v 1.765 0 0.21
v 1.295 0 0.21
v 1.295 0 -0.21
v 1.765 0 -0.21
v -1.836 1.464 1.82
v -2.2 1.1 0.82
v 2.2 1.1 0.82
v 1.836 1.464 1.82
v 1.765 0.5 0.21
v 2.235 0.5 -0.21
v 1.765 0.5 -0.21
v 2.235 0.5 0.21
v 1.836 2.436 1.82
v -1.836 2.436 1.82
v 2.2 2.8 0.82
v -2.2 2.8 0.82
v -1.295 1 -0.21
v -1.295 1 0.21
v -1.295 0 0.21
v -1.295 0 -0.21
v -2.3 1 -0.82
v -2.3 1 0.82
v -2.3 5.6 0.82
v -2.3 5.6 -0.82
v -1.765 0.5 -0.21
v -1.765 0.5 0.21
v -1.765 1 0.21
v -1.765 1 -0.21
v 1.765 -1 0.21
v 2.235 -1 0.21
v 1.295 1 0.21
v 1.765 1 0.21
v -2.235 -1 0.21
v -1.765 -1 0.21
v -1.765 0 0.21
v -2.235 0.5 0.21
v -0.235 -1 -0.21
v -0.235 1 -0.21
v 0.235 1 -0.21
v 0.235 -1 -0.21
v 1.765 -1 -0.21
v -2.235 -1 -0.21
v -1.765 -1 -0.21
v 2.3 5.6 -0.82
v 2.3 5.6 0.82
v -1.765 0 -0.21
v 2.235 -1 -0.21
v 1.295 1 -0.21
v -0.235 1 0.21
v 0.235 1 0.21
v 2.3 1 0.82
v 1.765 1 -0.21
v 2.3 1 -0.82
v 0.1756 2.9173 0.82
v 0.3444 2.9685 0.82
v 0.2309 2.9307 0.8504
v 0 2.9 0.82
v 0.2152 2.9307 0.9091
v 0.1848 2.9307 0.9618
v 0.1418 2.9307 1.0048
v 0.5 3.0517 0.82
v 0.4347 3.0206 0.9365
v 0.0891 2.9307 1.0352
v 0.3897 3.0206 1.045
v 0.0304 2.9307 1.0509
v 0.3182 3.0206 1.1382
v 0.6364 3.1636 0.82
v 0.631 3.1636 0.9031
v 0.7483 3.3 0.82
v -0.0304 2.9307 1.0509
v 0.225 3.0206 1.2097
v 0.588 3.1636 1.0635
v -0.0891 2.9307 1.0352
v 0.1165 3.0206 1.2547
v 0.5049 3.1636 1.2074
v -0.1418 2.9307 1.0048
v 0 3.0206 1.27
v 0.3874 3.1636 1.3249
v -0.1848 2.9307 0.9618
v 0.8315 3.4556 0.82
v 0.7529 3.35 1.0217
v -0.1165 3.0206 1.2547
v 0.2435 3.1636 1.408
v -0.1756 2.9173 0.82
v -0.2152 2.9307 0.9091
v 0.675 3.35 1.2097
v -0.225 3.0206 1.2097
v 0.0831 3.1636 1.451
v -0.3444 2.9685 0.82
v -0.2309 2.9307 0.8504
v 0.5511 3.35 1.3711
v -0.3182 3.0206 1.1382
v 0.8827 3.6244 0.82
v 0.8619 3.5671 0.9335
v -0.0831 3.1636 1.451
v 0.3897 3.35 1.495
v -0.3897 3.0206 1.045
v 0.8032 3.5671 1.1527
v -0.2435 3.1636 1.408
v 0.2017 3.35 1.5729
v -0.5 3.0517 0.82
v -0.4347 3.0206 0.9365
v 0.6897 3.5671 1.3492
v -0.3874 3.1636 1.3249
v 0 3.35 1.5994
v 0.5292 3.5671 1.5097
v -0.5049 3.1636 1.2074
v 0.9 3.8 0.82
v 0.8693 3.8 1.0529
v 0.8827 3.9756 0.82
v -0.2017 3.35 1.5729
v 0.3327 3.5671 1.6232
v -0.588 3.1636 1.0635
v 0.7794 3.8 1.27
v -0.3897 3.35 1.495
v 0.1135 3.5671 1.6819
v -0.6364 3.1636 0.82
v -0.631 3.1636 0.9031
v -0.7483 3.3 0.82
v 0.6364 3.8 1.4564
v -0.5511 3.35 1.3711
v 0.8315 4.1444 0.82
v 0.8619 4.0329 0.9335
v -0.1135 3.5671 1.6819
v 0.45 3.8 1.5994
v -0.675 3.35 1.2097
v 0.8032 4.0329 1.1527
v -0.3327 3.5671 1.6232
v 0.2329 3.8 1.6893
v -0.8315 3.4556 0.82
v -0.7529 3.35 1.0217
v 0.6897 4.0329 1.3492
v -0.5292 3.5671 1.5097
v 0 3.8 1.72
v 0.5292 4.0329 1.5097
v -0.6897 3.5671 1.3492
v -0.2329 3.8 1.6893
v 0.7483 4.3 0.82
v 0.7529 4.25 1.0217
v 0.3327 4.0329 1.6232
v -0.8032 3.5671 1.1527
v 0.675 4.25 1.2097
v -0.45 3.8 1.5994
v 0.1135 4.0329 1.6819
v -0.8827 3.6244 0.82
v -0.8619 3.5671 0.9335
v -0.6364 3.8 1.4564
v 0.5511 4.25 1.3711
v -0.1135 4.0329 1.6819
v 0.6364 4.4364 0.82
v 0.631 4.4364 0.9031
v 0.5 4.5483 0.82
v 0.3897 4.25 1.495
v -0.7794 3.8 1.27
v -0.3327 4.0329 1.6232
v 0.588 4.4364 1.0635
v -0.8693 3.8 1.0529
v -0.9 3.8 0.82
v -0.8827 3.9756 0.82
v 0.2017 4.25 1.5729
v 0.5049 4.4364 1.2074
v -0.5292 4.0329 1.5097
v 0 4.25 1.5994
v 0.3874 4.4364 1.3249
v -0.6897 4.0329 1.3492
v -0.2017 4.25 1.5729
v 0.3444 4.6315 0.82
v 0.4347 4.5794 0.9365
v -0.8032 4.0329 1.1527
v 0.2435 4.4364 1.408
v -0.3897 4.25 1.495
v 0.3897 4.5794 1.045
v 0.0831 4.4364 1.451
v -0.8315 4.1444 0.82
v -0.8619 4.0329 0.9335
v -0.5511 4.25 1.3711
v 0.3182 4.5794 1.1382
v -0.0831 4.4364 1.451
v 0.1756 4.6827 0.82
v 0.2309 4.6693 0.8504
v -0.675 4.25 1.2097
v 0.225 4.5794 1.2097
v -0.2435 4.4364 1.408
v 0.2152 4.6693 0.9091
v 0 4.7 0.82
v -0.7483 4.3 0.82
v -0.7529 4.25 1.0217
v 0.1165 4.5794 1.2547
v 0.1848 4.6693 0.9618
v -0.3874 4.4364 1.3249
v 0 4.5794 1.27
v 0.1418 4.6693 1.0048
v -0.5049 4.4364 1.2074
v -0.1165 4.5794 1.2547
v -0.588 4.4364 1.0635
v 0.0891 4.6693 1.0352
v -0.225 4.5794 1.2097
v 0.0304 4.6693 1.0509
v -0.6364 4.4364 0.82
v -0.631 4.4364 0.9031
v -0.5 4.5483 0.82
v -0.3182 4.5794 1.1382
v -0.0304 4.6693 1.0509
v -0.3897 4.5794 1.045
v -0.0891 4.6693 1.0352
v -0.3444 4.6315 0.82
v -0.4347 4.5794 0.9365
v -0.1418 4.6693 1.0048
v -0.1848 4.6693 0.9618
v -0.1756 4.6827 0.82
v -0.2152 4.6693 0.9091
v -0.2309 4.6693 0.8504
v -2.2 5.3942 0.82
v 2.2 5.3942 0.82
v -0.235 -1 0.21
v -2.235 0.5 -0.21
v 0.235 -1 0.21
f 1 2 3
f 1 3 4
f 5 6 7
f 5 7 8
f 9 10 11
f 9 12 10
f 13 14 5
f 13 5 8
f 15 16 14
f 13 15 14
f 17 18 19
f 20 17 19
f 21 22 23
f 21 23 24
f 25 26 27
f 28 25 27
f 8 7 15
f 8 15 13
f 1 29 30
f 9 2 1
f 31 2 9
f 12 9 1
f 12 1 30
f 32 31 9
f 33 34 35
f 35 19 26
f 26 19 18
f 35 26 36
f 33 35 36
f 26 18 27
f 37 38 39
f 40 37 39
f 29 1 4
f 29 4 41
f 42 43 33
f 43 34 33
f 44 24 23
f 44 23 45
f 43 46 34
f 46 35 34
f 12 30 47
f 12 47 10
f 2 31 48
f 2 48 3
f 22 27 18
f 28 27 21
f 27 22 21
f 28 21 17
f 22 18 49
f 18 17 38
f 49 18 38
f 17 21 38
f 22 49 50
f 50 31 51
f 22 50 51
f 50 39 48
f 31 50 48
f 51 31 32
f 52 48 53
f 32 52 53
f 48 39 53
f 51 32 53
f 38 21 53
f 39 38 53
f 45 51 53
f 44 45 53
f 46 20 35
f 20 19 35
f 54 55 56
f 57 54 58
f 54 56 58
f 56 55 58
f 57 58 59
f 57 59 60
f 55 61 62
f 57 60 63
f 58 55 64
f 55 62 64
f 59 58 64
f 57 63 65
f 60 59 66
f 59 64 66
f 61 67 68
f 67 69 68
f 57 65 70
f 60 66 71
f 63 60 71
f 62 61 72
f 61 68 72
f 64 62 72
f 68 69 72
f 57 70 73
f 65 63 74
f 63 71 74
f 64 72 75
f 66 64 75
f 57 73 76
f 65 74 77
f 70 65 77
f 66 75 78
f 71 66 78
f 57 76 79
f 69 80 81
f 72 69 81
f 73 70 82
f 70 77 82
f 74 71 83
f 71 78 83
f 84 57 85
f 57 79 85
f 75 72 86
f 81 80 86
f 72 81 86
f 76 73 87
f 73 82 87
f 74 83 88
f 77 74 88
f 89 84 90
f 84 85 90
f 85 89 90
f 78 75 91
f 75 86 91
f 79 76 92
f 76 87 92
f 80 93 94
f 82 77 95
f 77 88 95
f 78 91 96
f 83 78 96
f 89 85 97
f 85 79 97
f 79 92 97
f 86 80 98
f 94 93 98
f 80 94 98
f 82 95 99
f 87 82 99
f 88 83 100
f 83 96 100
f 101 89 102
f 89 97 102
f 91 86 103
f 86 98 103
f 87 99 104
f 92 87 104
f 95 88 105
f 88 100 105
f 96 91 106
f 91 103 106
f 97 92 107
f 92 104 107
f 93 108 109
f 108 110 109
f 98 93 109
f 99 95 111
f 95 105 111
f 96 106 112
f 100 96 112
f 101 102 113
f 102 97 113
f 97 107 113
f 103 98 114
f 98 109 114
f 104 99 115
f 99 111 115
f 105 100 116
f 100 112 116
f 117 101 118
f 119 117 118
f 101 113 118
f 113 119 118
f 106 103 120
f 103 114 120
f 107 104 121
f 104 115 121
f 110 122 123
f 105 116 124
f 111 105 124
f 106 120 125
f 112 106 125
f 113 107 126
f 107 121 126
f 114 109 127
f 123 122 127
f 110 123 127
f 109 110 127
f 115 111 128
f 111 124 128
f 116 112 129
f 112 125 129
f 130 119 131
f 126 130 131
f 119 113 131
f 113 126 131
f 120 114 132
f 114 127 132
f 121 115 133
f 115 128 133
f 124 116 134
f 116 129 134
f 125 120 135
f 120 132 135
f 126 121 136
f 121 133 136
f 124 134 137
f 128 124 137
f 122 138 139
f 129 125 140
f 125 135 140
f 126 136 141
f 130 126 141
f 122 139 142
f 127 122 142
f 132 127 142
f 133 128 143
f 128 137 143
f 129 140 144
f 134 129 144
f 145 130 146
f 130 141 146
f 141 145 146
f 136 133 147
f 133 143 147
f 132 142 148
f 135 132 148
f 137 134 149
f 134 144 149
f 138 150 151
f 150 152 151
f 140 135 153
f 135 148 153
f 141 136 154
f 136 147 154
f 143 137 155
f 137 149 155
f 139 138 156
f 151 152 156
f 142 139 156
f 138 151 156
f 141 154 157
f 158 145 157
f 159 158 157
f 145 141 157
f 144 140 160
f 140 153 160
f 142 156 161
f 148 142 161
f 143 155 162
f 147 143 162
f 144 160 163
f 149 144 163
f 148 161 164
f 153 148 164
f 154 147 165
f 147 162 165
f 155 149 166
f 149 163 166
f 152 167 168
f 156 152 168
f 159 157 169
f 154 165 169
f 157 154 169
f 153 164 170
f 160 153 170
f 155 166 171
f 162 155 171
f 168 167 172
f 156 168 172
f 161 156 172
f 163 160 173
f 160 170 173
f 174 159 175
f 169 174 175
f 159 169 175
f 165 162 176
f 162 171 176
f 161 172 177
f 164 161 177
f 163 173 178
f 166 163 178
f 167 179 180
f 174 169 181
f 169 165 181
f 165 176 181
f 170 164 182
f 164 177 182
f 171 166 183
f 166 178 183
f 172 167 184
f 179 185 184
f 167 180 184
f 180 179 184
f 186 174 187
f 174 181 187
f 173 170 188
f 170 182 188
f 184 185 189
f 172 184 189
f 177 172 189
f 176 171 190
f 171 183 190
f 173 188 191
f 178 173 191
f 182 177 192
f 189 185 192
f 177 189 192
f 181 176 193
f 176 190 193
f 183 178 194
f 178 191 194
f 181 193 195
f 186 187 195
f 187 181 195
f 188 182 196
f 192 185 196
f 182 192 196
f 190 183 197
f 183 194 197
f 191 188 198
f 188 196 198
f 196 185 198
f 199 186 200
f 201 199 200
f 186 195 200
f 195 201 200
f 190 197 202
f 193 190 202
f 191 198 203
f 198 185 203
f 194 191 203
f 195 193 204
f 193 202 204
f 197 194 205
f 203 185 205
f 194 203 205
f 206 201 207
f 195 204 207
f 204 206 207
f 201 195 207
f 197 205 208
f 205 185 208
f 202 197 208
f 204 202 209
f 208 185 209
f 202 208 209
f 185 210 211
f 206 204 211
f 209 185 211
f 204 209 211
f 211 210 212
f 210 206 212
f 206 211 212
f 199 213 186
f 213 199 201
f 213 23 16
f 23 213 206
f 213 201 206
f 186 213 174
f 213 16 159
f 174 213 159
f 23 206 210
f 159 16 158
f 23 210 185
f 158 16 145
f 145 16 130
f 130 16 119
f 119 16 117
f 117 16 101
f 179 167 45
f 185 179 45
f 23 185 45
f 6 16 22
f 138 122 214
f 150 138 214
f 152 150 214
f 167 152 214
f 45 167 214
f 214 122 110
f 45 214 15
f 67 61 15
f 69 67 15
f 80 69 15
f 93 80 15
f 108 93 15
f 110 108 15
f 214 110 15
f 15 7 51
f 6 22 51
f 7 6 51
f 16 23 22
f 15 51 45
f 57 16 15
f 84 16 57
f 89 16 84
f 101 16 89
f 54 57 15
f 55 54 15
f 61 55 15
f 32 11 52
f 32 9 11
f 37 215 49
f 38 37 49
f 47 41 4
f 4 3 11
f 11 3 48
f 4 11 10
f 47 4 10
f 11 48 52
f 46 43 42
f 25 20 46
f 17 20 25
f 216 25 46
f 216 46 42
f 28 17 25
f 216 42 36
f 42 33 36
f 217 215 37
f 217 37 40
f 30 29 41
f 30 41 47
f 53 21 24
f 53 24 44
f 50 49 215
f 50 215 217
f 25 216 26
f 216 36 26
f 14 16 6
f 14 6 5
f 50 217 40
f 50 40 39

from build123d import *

# Parameters (mm, degrees)
BOSS_EXTRUDE1_DEPTH   = 0.21
SKETCH1_W             = 0.47
SKETCH1_H             = 2
BOSS_EXTRUDE1_2_DEPTH = 0.21
BOSS_EXTRUDE1_3_DEPTH = 0.21
SKETCH2_W             = 4.6
SKETCH2_H             = 1.64
BOSS_EXTRUDE2_DEPTH   = 4.6
REVOLVE1_ANGLE        = 180
SKETCH4_W             = 4.4
SKETCH4_H             = 1.7
BOSS_EXTRUDE3_DEPTH   = 1
CHAMFER1_SIZE         = 1
CHAMFER1_SIZE_2       = 0.363970234


with BuildPart() as part:
    # Sketch1 → Boss-Extrude1 (new, symmetric)
    with BuildSketch(Plane.XY):
        Polygon((-1.295, 1), (-1.295, 0), (-1.765, 0), (-1.765, -1), (-2.235, -1), (-2.235, 0.5), (-1.765, 0.5), (-1.765, 1), align=None)
    extrude(amount=BOSS_EXTRUDE1_DEPTH, both=True)



with BuildPart() as body_2:
    # Sketch1 → Boss-Extrude1 2 (new, symmetric)
    with BuildSketch(Plane.XY):
        Rectangle(SKETCH1_W, SKETCH1_H)
    extrude(amount=BOSS_EXTRUDE1_2_DEPTH, both=True)


with BuildPart() as body_3:
    # Sketch1 → Boss-Extrude1 3 (new, symmetric)
    with BuildSketch(Plane.XY):
        Polygon((1.765, 1), (1.295, 1), (1.295, 0), (1.765, 0), (1.765, -1), (2.235, -1), (2.235, 0.5), (1.765, 0.5), align=None)
    extrude(amount=BOSS_EXTRUDE1_3_DEPTH, both=True)


with BuildPart() as part_1:
    add(part.part)

    add(body_2.part)  # Boss-Extrude2 merges body 2

    add(body_3.part)  # Boss-Extrude2 merges body 3
    # Sketch2 → Boss-Extrude2 (add)
    with BuildSketch(Plane(origin=(0, 1, 0), x_dir=(1, 0, 0), z_dir=(0, 1, 0))):
        Rectangle(SKETCH2_W, SKETCH2_H)
    extrude(amount=BOSS_EXTRUDE2_DEPTH)

    # Sketch3 → Revolve1 (revolve)
    with BuildSketch(Plane.XY.offset(0.82)):
        with BuildLine():
            Line((0, 4.7), (0, 2.9))
            ThreePointArc((0, 2.9), (0.9, 3.8), (0, 4.7))
        make_face()
    revolve(axis=Axis((0, 4.7, 0.82), (0, -1, 0)), revolution_arc=REVOLVE1_ANGLE)

    # Sketch4 → Boss-Extrude3 (add)
    with BuildSketch(Plane.XY.offset(0.82)):
        with Locations((0, 1.95)):
            Rectangle(SKETCH4_W, SKETCH4_H)
    extrude(amount=BOSS_EXTRUDE3_DEPTH)

    # Chamfer1
    # the kernel refuses this chamfer: 1, 0.363970234 mm, written as the material it takes off along each edge
    with BuildSketch(Plane(origin=(4.794194733, 1.1, 1.82), x_dir=(0, -0.013184058198646006, -0.9999130865277315), z_dir=(-1, 0, 0))) as chamfer1_piece_1_section:
        Polygon((CHAMFER1_SIZE * 0.999913086528, -CHAMFER1_SIZE * 0.0131840581986), (-CHAMFER1_SIZE_2 * 0.0131840582083, -CHAMFER1_SIZE_2 * 0.999913087259), (0, 0), align=None)
    chamfer1_piece_1 = extrude(amount=9.588389465, mode=Mode.PRIVATE)
    chamfer1_piece_1 = split(chamfer1_piece_1, bisect_by=Plane(origin=(0, 1.212526608, 0.82), z_dir=(0, 0, 1)), keep=Keep.TOP, mode=Mode.PRIVATE)
    add(chamfer1_piece_1, mode=Mode.SUBTRACT)
    with BuildSketch(Plane(origin=(-2.2, -1.494194733, 1.82), x_dir=(-0.013184058198646006, 0, -0.9999130865277315), z_dir=(0, 1, 0))) as chamfer1_piece_2_section:
        Polygon((CHAMFER1_SIZE * 0.999913086528, -CHAMFER1_SIZE * 0.0131840581986), (-CHAMFER1_SIZE_2 * 0.0131840582083, -CHAMFER1_SIZE_2 * 0.999913087259), (0, 0), align=None)
    chamfer1_piece_2 = extrude(amount=6.888389465, mode=Mode.PRIVATE)
    chamfer1_piece_2 = split(chamfer1_piece_2, bisect_by=Plane(origin=(-2.087473392, 1.95, 0.82), z_dir=(0, 0, 1)), keep=Keep.TOP, mode=Mode.PRIVATE)
    add(chamfer1_piece_2, mode=Mode.SUBTRACT)
    with BuildSketch(Plane(origin=(2.2, 5.394194733, 1.82), x_dir=(0.013184058198646006, 0, -0.9999130865277315), z_dir=(0, -1, 0))) as chamfer1_piece_3_section:
        Polygon((CHAMFER1_SIZE * 0.999913086528, -CHAMFER1_SIZE * 0.0131840581986), (-CHAMFER1_SIZE_2 * 0.0131840582083, -CHAMFER1_SIZE_2 * 0.999913087259), (0, 0), align=None)
    chamfer1_piece_3 = extrude(amount=6.888389465, mode=Mode.PRIVATE)
    chamfer1_piece_3 = split(chamfer1_piece_3, bisect_by=Plane(origin=(2.087473392, 1.95, 0.82), z_dir=(0, 0, 1)), keep=Keep.TOP, mode=Mode.PRIVATE)
    add(chamfer1_piece_3, mode=Mode.SUBTRACT)
    with BuildSketch(Plane(origin=(-4.794194733, 2.8, 1.82), x_dir=(0, 0.013184058198646006, -0.9999130865277315), z_dir=(1, 0, 0))) as chamfer1_piece_4_section:
        Polygon((CHAMFER1_SIZE * 0.999913086528, -CHAMFER1_SIZE * 0.0131840581986), (-CHAMFER1_SIZE_2 * 0.0131840582083, -CHAMFER1_SIZE_2 * 0.999913087259), (0, 0), align=None)
    chamfer1_piece_4 = extrude(amount=9.588389465, mode=Mode.PRIVATE)
    chamfer1_piece_4 = split(chamfer1_piece_4, bisect_by=Plane(origin=(0, 2.687473392, 0.82), z_dir=(0, 0, 1)), keep=Keep.TOP, mode=Mode.PRIVATE)
    add(chamfer1_piece_4, mode=Mode.SUBTRACT)


solid = part_1.part
